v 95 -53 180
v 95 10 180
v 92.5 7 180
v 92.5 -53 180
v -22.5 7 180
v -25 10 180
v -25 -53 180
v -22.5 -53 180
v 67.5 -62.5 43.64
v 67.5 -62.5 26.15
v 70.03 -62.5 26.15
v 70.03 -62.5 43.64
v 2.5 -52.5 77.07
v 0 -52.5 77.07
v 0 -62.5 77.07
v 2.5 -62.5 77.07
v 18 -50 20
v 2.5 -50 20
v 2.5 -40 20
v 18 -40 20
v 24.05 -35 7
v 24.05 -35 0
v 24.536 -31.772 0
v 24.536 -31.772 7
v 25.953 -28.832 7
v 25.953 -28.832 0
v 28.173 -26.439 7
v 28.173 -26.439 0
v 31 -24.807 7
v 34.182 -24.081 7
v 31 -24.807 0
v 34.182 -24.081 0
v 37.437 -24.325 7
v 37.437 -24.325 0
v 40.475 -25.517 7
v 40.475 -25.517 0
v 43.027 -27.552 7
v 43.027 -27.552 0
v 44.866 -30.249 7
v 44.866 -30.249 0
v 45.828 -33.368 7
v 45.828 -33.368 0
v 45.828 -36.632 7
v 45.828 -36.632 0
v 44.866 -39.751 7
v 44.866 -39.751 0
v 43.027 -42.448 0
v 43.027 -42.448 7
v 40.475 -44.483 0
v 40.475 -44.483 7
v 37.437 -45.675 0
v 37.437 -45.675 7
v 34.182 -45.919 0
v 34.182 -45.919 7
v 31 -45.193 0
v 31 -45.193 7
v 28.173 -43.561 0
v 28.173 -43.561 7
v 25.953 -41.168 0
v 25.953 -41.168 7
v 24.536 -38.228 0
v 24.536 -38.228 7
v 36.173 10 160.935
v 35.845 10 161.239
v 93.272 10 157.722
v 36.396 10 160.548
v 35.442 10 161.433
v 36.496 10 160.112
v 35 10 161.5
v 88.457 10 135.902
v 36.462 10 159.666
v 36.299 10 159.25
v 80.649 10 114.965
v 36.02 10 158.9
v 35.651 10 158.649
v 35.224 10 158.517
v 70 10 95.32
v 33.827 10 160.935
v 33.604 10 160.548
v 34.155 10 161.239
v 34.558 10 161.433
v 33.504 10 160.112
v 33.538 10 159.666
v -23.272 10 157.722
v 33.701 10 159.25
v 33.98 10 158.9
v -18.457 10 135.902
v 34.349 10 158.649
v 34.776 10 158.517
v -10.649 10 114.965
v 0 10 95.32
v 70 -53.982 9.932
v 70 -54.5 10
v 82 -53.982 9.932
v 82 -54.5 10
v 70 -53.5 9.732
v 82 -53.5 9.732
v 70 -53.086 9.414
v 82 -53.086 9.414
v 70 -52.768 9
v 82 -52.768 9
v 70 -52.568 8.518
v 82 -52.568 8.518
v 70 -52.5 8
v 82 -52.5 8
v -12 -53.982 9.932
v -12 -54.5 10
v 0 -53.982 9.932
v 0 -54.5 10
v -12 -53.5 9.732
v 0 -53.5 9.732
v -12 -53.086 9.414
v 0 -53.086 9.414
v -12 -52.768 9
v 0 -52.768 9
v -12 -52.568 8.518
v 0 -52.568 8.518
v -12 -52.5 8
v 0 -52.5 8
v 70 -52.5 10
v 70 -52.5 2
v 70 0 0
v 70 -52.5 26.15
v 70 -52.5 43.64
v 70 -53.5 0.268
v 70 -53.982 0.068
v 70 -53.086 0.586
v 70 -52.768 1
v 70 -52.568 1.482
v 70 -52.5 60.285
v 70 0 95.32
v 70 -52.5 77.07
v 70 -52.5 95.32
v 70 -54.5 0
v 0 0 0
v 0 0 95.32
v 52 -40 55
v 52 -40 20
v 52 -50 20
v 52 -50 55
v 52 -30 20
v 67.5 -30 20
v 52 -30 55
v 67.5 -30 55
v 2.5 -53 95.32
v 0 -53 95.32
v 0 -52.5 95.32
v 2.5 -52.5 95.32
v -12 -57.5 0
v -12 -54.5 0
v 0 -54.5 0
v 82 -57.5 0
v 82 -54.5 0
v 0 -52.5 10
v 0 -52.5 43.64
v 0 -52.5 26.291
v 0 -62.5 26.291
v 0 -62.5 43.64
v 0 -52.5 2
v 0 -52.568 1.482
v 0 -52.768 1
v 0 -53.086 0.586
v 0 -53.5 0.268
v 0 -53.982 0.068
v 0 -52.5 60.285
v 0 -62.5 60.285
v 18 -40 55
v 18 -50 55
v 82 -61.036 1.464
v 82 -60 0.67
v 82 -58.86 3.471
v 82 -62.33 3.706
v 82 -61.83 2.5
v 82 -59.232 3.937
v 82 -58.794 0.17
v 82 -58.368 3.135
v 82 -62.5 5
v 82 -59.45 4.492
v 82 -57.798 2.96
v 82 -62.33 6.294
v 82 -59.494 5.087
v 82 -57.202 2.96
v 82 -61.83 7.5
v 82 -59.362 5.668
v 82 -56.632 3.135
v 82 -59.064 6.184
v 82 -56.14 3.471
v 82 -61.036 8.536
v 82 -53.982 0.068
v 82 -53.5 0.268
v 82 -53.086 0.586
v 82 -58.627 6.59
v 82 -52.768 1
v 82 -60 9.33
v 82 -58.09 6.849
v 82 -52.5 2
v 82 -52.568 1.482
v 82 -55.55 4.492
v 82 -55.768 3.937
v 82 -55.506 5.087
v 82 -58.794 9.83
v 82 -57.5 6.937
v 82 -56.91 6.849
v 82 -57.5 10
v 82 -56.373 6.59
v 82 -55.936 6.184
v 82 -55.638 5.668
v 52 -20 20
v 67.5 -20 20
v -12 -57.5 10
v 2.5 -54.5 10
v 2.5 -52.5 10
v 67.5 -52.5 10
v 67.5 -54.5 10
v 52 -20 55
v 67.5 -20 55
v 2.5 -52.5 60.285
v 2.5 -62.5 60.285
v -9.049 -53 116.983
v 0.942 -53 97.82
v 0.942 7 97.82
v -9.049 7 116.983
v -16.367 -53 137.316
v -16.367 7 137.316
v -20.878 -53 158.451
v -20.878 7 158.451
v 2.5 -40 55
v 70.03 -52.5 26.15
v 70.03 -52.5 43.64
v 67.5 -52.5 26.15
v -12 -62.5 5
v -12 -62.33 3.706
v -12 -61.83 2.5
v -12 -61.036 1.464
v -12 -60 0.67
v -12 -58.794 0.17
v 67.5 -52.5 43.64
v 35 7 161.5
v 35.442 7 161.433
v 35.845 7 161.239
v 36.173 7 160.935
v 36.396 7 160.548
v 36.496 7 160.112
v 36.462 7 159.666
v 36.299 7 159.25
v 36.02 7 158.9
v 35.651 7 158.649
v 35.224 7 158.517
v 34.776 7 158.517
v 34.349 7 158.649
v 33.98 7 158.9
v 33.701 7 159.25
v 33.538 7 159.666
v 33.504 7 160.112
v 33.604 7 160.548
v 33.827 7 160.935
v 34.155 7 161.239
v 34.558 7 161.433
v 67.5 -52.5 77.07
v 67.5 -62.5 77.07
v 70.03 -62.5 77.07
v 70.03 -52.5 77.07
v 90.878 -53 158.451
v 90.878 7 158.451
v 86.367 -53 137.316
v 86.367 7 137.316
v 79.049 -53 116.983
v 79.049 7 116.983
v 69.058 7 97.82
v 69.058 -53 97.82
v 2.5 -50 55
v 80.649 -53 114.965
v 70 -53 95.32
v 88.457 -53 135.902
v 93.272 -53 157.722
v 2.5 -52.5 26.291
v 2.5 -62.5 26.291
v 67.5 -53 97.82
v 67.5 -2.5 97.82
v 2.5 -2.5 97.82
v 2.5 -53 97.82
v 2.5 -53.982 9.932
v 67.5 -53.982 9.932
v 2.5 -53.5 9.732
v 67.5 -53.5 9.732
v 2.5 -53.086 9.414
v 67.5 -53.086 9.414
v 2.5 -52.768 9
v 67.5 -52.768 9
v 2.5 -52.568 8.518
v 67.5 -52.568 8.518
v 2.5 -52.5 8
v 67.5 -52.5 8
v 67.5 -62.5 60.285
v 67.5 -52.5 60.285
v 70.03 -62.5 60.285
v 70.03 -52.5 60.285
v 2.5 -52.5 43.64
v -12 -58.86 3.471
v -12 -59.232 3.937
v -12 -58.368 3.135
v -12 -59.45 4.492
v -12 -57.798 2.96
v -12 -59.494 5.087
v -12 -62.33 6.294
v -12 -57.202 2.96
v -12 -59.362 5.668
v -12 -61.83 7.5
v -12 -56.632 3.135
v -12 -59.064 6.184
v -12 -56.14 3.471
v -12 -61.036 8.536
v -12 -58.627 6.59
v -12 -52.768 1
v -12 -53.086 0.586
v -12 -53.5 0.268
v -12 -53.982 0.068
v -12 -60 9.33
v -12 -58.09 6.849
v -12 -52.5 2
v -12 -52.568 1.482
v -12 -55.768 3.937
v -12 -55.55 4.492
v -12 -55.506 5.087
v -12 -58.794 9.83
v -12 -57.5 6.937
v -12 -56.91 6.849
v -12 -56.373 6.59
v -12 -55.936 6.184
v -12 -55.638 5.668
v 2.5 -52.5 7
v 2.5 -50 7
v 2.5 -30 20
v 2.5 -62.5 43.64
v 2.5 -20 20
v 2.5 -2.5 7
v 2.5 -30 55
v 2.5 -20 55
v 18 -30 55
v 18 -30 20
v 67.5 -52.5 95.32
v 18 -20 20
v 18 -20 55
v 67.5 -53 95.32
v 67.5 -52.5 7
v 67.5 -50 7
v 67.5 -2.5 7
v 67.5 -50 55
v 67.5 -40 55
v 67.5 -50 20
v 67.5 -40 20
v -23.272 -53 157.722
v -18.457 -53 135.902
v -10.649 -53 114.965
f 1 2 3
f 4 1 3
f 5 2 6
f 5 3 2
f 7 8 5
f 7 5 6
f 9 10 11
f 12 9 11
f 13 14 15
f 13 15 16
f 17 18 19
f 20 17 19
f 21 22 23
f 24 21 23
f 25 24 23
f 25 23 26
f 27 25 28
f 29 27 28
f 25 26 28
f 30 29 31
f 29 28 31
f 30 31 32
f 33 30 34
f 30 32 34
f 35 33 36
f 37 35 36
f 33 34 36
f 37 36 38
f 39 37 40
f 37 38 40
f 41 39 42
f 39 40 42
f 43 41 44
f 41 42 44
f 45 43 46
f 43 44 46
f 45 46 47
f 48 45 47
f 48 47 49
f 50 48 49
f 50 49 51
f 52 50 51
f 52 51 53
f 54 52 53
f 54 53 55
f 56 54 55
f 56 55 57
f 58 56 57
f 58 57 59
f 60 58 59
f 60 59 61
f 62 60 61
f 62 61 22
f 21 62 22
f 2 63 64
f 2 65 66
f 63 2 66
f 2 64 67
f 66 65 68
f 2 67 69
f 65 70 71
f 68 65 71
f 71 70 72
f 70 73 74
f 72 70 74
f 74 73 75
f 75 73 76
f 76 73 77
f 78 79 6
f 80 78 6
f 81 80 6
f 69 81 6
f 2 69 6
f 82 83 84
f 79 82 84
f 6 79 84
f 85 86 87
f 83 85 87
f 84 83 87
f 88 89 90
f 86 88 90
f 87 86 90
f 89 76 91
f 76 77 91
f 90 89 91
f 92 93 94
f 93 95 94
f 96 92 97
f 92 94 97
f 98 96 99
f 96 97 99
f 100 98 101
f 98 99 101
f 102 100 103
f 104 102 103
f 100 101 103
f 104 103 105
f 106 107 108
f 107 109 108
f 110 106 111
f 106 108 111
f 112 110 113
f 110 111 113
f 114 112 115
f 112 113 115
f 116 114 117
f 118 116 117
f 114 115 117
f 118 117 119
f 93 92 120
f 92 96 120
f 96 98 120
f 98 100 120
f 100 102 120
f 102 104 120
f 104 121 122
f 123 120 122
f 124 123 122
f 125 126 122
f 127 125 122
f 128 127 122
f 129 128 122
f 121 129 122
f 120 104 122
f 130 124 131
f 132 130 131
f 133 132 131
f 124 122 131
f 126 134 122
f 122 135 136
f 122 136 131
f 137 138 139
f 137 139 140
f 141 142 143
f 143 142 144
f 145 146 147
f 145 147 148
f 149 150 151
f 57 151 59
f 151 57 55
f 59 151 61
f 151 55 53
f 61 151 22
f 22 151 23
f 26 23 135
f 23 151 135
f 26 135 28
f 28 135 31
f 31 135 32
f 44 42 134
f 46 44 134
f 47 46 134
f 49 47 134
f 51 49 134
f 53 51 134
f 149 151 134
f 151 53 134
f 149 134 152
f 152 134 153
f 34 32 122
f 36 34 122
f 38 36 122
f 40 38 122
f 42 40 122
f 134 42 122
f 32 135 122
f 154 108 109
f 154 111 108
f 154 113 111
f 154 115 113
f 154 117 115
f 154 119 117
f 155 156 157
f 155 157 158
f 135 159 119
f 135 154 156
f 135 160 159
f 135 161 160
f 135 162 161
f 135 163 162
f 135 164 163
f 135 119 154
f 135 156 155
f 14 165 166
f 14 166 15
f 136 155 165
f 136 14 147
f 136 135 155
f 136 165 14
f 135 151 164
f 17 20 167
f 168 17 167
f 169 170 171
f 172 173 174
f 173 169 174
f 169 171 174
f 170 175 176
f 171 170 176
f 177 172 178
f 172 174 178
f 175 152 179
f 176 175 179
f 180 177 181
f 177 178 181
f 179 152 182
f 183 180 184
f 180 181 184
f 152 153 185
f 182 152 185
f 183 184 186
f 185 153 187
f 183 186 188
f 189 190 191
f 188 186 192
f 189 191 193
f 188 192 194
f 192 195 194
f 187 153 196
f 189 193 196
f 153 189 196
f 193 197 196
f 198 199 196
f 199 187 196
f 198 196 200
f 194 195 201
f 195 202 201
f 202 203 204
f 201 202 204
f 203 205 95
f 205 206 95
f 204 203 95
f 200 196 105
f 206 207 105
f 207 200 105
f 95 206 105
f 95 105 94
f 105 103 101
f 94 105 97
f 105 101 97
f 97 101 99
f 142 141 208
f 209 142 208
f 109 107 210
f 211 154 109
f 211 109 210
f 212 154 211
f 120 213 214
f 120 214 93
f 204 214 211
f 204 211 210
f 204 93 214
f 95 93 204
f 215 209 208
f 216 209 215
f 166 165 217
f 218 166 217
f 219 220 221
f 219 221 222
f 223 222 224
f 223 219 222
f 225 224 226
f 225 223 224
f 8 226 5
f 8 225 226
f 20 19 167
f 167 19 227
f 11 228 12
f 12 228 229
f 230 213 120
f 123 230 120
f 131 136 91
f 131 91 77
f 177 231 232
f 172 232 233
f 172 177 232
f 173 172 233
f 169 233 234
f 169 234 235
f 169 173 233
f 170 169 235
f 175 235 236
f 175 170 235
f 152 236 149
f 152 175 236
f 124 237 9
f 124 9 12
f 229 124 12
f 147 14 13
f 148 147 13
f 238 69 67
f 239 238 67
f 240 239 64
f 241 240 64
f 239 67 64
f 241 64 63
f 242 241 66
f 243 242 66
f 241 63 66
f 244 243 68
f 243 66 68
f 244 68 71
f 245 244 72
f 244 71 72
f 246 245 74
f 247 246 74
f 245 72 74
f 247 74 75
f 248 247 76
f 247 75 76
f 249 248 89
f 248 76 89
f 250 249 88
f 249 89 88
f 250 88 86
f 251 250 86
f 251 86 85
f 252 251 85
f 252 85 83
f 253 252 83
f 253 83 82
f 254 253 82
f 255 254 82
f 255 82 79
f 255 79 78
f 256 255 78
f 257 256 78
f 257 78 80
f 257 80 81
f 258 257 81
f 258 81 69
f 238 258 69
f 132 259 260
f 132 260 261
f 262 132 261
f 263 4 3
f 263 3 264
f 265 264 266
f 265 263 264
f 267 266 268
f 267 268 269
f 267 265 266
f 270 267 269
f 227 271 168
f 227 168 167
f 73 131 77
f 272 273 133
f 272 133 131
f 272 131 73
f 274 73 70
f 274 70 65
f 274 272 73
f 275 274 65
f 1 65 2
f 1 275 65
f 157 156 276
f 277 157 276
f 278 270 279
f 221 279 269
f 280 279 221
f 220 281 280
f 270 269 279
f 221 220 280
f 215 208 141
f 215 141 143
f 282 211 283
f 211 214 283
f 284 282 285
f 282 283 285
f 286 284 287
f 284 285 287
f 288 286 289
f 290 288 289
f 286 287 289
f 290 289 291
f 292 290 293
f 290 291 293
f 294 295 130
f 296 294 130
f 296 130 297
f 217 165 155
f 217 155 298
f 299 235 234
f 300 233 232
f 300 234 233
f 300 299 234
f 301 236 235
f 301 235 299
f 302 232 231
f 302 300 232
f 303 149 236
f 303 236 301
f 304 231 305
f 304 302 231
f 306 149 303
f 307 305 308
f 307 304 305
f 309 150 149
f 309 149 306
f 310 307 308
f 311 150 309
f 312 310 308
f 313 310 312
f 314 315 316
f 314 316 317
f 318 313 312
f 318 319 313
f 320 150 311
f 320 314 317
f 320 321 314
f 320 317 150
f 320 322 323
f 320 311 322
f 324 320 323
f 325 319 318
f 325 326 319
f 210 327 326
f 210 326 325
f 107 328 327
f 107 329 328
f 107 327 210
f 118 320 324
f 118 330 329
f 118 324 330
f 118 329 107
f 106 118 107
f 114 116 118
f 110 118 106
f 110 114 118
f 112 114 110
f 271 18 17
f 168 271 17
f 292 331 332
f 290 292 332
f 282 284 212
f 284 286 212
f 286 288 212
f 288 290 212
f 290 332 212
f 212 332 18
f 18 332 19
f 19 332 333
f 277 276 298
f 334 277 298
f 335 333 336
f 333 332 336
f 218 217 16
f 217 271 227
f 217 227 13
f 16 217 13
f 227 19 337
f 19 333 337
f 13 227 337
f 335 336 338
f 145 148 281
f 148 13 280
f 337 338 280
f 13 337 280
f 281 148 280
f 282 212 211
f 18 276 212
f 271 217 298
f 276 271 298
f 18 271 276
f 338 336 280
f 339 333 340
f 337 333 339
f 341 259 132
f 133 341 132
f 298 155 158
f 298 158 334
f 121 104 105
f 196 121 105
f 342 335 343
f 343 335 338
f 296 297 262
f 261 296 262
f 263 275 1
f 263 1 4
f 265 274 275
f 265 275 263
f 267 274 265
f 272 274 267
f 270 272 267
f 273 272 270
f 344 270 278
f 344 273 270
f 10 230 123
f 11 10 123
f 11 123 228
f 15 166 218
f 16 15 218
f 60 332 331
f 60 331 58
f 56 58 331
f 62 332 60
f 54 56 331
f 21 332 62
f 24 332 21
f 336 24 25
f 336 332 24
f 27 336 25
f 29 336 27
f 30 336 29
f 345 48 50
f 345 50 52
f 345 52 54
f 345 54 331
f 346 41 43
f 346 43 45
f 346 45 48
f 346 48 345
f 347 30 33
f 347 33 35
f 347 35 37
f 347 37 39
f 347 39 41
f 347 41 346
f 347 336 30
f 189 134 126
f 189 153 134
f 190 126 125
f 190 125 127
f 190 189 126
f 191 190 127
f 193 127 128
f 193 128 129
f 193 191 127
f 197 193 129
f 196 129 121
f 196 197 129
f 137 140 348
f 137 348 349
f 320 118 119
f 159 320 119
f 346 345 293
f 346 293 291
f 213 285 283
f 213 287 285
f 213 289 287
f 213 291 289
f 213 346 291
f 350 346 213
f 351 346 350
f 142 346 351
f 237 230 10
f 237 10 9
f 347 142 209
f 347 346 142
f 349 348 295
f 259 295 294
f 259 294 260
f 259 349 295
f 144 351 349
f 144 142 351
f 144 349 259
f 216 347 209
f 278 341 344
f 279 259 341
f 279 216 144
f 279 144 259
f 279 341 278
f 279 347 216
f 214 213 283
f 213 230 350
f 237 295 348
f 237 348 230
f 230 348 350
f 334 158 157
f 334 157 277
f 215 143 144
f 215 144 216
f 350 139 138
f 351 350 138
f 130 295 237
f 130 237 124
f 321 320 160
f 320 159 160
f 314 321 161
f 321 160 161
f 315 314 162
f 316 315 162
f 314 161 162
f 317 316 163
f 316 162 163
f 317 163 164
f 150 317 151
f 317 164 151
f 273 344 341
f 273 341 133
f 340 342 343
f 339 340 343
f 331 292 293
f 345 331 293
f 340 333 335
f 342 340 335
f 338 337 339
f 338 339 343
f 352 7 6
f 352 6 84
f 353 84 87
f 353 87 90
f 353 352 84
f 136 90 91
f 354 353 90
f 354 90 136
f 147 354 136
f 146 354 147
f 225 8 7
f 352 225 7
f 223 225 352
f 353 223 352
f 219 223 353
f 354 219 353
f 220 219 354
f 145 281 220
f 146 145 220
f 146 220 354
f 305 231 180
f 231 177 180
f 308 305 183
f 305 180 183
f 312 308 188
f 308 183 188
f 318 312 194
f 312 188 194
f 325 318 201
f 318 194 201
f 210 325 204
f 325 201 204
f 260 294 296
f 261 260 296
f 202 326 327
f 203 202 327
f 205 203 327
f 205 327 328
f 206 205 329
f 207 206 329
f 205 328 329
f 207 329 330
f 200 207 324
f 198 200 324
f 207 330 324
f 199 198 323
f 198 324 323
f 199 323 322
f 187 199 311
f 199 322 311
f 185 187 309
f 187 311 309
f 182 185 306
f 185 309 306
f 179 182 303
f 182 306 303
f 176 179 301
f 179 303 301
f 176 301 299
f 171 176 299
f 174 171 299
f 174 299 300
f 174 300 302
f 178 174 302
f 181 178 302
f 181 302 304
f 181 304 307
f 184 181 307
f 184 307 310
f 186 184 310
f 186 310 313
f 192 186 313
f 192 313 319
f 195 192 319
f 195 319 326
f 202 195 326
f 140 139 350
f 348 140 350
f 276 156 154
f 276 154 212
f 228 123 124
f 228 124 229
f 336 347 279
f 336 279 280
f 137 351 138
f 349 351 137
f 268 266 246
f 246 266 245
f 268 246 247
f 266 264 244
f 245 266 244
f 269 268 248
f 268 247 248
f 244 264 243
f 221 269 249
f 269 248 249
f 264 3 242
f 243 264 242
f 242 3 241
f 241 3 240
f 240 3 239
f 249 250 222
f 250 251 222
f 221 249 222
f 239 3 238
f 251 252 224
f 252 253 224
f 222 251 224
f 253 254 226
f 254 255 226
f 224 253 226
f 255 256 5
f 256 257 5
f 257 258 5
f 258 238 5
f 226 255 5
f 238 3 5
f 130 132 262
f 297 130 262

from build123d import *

# Parameters (mm, degrees)
SKETCH_1_W                = 70
SKETCH_1_H                = 70
EXTRUDE_1_DEPTH           = 180
SKETCH_3_W                = 65
SKETCH_3_H                = 65
CUT_EXTRUDE_1_DEPTH       = 173
SKETCH_4_R                = 10.95
CUT_EXTRUDE_2_DEPTH       = 137
SKETCH_5_W                = 50
SKETCH_5_H                = 55
CUT_EXTRUDE_3_DEPTH       = 137
SKETCH_6_W                = 35
SKETCH_6_H                = 10
EXTRUDE_2_DEPTH           = 18
CUT_EXTRUDE_4_DEPTH       = 200.321348581
CUT_EXTRUDE_4_DEPTH_BACK  = 200.321348581
SKETCH_7_W                = 70
SKETCH_7_H                = 20
SKETCH_9_W                = 70
SKETCH_9_H                = 180
EXTRUDE_3_DEPTH           = 2.5
EXTRUDE_4_DEPTH           = 10
EXTRUDE_4_DEPTH_BACK      = 53
CUT_EXTRUDE_7_DEPTH       = 60
SKETCH_18_W               = 65
SKETCH_18_H               = 47.5
CUT_EXTRUDE_12_DEPTH      = 105
CUT_EXTRUDE_13_DEPTH      = 105
CUT_EXTRUDE_13_DEPTH_BACK = 2.5
SKETCH_20_W               = 65
SKETCH_20_H               = 125.518576077
SKETCH_21_R               = 1.5
CUT_EXTRUDE_14_DEPTH      = 10
SKETCH_23_W               = 94
SKETCH_23_H               = 10
EXTRUDE_5_DEPTH           = 10
SKETCH_24_R               = 2
CUT_EXTRUDE_15_DEPTH      = 194
FILLET_1_R                = 2
FILLET_2_R                = 2
FILLET_3_R                = 2
FILLET_4_R                = 5
SKETCH_25_W               = 2.52996266
SKETCH_25_H               = 16.78546259
SKETCH_25_H_2             = 17.490734126
SKETCH_25_W_2             = 2.5
SKETCH_25_H_3             = 17.349679819
EXTRUDE_6_DEPTH           = 10


with BuildPart() as part:
    # 스케치1 → 보스-돌출1 (new body)
    with BuildSketch(Plane.XY):
        with Locations((35, -35)):
            Rectangle(SKETCH_1_W, SKETCH_1_H)
    extrude(amount=EXTRUDE_1_DEPTH)

    # 스케치3 → 컷-돌출1 (cut)
    with BuildSketch(Plane.XY.offset(180)):
        with Locations((35, -35)):
            Rectangle(SKETCH_3_W, SKETCH_3_H)
    extrude(amount=-CUT_EXTRUDE_1_DEPTH, mode=Mode.SUBTRACT)

    # 스케치4 → 컷-돌출2 (cut)
    with BuildSketch(Plane(origin=(0, 0, 0), x_dir=(-1, 0, 0), z_dir=(0, 0, -1))):
        with Locations((-35, -35)):
            Circle(SKETCH_4_R)
    extrude(amount=-CUT_EXTRUDE_2_DEPTH, mode=Mode.SUBTRACT)

    # 스케치5 → 컷-돌출3 (cut)
    with BuildSketch(Plane(origin=(70, 0, 0), x_dir=(0, 0, -1), z_dir=(1, 0, 0))):
        with Locations((-155, -35)):
            Rectangle(SKETCH_5_W, SKETCH_5_H)
    extrude(amount=-CUT_EXTRUDE_3_DEPTH, mode=Mode.SUBTRACT)

    # 스케치6 → 보스-돌출2 (add)
    with BuildSketch(Plane.ZY):
        with Locations((37.5, -25)):
            Rectangle(SKETCH_6_W, SKETCH_6_H)
        with Locations((37.5, -45)):
            Rectangle(SKETCH_6_W, SKETCH_6_H)
    extrude_2 = extrude(amount=-EXTRUDE_2_DEPTH)

    # 대칭 복사1: 보스-돌출2 across plane
    add(extrude_2.mirror(Plane(origin=(35, 0, 0), x_dir=(0, 0, 1), z_dir=(1, 0, 0))))

    # 스케치7 → 컷-돌출4 (cut, two sides: drawn at the far end of the back side and taken through both)
    with BuildSketch(Plane.XY.offset(7).offset(-CUT_EXTRUDE_4_DEPTH_BACK)):
        with Locations((35, -60)):
            Rectangle(SKETCH_7_W, SKETCH_7_H)
    extrude(amount=CUT_EXTRUDE_4_DEPTH + CUT_EXTRUDE_4_DEPTH_BACK, mode=Mode.SUBTRACT)

    # 스케치9 → 보스-돌출3 (add)
    with BuildSketch(Plane.XZ.offset(50)):
        with Locations((35, 90)):
            Rectangle(SKETCH_9_W, SKETCH_9_H)
    extrude(amount=EXTRUDE_3_DEPTH)

    # 스케치11 → 보스-돌출4 (add, two sides: drawn at the far end of the back side and taken through both)
    with BuildSketch(Plane(origin=(0, 0, 0), x_dir=(1, 0, 0), z_dir=(0, 1, 0)).offset(-EXTRUDE_4_DEPTH_BACK)):
        with BuildLine():
            Line((0, -95.320459485), (70, -95.320459485))
            ThreePointArc((70, -95.320459485), (88.456704779, -135.901627622), (95, -180))
            Line((95, -180), (-25, -180))
            ThreePointArc((-25, -180), (-18.456704779, -135.901627622), (0, -95.320459485))
        make_face()
    extrude(amount=EXTRUDE_4_DEPTH + EXTRUDE_4_DEPTH_BACK)

    # 스케치13 → 컷-돌출7 (cut)
    with BuildSketch(Plane.XZ.offset(53)):
        with BuildLine():
            Line((-22.5, 180), (92.5, 180))
            ThreePointArc((92.5, 180), (86.367270586, 137.316234441), (69.058371922, 97.820459485))
            Line((69.058371922, 97.820459485), (0.941628078, 97.820459485))
            ThreePointArc((0.941628078, 97.820459485), (-16.367270586, 137.316234441), (-22.5, 180))
        make_face()
    extrude(amount=-CUT_EXTRUDE_7_DEPTH, mode=Mode.SUBTRACT)

    # 스케치18 → 컷-돌출12 (cut)
    with BuildSketch(Plane(origin=(0, 0, 95.320459485), x_dir=(-1, 0, 0), z_dir=(0, 0, -1))):
        with Locations((-35, -26.25)):
            Rectangle(SKETCH_18_W, SKETCH_18_H)
    extrude(amount=-CUT_EXTRUDE_12_DEPTH, mode=Mode.SUBTRACT)

    # 스케치20 → 컷-돌출13 (cut, two sides: drawn at the far end of the back side and taken through both)
    with BuildSketch(Plane.XZ.offset(52.5).offset(-CUT_EXTRUDE_13_DEPTH_BACK)):
        with Locations((35, 69.759288039)):
            Rectangle(SKETCH_20_W, SKETCH_20_H)
    extrude(amount=CUT_EXTRUDE_13_DEPTH + CUT_EXTRUDE_13_DEPTH_BACK, mode=Mode.SUBTRACT)

    # 스케치21 → 컷-돌출14 (cut)
    with BuildSketch(Plane(origin=(0, 10, 0), x_dir=(1, 0, 0), z_dir=(0, 1, 0))):
        with Locations(Location((35, -160, 0), (0, 0, 270))):
            Circle(SKETCH_21_R)
    extrude(amount=-CUT_EXTRUDE_14_DEPTH, mode=Mode.SUBTRACT)

    # 스케치23 → 보스-돌출5 (add)
    with BuildSketch(Plane.XZ.offset(52.5)):
        with Locations((35, 5)):
            Rectangle(SKETCH_23_W, SKETCH_23_H)
    extrude(amount=EXTRUDE_5_DEPTH)

    # 스케치24 → 컷-돌출15 (cut)
    with BuildSketch(Plane.ZY.offset(12)):
        with Locations((4.937361109, -57.5)):
            Circle(SKETCH_24_R)
    extrude(amount=-CUT_EXTRUDE_15_DEPTH, mode=Mode.SUBTRACT)

    # 필렛1
    fillet_1_edges = [part.edges().sort_by_distance(p)[0] for p in [
        (35, -52.5, 10),
    ]]
    fillet(fillet_1_edges, radius=FILLET_1_R)

    # 필렛2
    fillet_2_edges = [part.edges().sort_by_distance(p)[0] for p in [
        (76, -52.5, 10),
        (-6, -52.5, 10),
    ]]
    fillet(fillet_2_edges, radius=FILLET_2_R)

    # 필렛3
    fillet_3_edges = [part.edges().sort_by_distance(p)[0] for p in [
        (-6, -52.5, 0),
        (76, -52.5, 0),
    ]]
    fillet(fillet_3_edges, radius=FILLET_3_R)

    # 필렛4
    fillet_4_edges = [part.edges().sort_by_distance(p)[0] for p in [
        (35, -62.5, 10),
        (35, -62.5, 0),
    ]]
    fillet(fillet_4_edges, radius=FILLET_4_R - 0.0001)  # a hair under: the kernel refuses the full size

    # 스케치25 → 보스-돌출6 (add)
    with BuildSketch(Plane.XZ.offset(52.5)):
        with Locations((68.76498133, 68.677635779)):
            Rectangle(SKETCH_25_W, SKETCH_25_H)
        with Locations((68.76498133, 34.895129139)):
            Rectangle(SKETCH_25_W, SKETCH_25_H_2)
        with Locations((1.25, 68.677635779)):
            Rectangle(SKETCH_25_W_2, SKETCH_25_H)
        with Locations((1.25, 34.965656293)):
            Rectangle(SKETCH_25_W_2, SKETCH_25_H_3)
    extrude(amount=EXTRUDE_6_DEPTH)


solid = part.part
